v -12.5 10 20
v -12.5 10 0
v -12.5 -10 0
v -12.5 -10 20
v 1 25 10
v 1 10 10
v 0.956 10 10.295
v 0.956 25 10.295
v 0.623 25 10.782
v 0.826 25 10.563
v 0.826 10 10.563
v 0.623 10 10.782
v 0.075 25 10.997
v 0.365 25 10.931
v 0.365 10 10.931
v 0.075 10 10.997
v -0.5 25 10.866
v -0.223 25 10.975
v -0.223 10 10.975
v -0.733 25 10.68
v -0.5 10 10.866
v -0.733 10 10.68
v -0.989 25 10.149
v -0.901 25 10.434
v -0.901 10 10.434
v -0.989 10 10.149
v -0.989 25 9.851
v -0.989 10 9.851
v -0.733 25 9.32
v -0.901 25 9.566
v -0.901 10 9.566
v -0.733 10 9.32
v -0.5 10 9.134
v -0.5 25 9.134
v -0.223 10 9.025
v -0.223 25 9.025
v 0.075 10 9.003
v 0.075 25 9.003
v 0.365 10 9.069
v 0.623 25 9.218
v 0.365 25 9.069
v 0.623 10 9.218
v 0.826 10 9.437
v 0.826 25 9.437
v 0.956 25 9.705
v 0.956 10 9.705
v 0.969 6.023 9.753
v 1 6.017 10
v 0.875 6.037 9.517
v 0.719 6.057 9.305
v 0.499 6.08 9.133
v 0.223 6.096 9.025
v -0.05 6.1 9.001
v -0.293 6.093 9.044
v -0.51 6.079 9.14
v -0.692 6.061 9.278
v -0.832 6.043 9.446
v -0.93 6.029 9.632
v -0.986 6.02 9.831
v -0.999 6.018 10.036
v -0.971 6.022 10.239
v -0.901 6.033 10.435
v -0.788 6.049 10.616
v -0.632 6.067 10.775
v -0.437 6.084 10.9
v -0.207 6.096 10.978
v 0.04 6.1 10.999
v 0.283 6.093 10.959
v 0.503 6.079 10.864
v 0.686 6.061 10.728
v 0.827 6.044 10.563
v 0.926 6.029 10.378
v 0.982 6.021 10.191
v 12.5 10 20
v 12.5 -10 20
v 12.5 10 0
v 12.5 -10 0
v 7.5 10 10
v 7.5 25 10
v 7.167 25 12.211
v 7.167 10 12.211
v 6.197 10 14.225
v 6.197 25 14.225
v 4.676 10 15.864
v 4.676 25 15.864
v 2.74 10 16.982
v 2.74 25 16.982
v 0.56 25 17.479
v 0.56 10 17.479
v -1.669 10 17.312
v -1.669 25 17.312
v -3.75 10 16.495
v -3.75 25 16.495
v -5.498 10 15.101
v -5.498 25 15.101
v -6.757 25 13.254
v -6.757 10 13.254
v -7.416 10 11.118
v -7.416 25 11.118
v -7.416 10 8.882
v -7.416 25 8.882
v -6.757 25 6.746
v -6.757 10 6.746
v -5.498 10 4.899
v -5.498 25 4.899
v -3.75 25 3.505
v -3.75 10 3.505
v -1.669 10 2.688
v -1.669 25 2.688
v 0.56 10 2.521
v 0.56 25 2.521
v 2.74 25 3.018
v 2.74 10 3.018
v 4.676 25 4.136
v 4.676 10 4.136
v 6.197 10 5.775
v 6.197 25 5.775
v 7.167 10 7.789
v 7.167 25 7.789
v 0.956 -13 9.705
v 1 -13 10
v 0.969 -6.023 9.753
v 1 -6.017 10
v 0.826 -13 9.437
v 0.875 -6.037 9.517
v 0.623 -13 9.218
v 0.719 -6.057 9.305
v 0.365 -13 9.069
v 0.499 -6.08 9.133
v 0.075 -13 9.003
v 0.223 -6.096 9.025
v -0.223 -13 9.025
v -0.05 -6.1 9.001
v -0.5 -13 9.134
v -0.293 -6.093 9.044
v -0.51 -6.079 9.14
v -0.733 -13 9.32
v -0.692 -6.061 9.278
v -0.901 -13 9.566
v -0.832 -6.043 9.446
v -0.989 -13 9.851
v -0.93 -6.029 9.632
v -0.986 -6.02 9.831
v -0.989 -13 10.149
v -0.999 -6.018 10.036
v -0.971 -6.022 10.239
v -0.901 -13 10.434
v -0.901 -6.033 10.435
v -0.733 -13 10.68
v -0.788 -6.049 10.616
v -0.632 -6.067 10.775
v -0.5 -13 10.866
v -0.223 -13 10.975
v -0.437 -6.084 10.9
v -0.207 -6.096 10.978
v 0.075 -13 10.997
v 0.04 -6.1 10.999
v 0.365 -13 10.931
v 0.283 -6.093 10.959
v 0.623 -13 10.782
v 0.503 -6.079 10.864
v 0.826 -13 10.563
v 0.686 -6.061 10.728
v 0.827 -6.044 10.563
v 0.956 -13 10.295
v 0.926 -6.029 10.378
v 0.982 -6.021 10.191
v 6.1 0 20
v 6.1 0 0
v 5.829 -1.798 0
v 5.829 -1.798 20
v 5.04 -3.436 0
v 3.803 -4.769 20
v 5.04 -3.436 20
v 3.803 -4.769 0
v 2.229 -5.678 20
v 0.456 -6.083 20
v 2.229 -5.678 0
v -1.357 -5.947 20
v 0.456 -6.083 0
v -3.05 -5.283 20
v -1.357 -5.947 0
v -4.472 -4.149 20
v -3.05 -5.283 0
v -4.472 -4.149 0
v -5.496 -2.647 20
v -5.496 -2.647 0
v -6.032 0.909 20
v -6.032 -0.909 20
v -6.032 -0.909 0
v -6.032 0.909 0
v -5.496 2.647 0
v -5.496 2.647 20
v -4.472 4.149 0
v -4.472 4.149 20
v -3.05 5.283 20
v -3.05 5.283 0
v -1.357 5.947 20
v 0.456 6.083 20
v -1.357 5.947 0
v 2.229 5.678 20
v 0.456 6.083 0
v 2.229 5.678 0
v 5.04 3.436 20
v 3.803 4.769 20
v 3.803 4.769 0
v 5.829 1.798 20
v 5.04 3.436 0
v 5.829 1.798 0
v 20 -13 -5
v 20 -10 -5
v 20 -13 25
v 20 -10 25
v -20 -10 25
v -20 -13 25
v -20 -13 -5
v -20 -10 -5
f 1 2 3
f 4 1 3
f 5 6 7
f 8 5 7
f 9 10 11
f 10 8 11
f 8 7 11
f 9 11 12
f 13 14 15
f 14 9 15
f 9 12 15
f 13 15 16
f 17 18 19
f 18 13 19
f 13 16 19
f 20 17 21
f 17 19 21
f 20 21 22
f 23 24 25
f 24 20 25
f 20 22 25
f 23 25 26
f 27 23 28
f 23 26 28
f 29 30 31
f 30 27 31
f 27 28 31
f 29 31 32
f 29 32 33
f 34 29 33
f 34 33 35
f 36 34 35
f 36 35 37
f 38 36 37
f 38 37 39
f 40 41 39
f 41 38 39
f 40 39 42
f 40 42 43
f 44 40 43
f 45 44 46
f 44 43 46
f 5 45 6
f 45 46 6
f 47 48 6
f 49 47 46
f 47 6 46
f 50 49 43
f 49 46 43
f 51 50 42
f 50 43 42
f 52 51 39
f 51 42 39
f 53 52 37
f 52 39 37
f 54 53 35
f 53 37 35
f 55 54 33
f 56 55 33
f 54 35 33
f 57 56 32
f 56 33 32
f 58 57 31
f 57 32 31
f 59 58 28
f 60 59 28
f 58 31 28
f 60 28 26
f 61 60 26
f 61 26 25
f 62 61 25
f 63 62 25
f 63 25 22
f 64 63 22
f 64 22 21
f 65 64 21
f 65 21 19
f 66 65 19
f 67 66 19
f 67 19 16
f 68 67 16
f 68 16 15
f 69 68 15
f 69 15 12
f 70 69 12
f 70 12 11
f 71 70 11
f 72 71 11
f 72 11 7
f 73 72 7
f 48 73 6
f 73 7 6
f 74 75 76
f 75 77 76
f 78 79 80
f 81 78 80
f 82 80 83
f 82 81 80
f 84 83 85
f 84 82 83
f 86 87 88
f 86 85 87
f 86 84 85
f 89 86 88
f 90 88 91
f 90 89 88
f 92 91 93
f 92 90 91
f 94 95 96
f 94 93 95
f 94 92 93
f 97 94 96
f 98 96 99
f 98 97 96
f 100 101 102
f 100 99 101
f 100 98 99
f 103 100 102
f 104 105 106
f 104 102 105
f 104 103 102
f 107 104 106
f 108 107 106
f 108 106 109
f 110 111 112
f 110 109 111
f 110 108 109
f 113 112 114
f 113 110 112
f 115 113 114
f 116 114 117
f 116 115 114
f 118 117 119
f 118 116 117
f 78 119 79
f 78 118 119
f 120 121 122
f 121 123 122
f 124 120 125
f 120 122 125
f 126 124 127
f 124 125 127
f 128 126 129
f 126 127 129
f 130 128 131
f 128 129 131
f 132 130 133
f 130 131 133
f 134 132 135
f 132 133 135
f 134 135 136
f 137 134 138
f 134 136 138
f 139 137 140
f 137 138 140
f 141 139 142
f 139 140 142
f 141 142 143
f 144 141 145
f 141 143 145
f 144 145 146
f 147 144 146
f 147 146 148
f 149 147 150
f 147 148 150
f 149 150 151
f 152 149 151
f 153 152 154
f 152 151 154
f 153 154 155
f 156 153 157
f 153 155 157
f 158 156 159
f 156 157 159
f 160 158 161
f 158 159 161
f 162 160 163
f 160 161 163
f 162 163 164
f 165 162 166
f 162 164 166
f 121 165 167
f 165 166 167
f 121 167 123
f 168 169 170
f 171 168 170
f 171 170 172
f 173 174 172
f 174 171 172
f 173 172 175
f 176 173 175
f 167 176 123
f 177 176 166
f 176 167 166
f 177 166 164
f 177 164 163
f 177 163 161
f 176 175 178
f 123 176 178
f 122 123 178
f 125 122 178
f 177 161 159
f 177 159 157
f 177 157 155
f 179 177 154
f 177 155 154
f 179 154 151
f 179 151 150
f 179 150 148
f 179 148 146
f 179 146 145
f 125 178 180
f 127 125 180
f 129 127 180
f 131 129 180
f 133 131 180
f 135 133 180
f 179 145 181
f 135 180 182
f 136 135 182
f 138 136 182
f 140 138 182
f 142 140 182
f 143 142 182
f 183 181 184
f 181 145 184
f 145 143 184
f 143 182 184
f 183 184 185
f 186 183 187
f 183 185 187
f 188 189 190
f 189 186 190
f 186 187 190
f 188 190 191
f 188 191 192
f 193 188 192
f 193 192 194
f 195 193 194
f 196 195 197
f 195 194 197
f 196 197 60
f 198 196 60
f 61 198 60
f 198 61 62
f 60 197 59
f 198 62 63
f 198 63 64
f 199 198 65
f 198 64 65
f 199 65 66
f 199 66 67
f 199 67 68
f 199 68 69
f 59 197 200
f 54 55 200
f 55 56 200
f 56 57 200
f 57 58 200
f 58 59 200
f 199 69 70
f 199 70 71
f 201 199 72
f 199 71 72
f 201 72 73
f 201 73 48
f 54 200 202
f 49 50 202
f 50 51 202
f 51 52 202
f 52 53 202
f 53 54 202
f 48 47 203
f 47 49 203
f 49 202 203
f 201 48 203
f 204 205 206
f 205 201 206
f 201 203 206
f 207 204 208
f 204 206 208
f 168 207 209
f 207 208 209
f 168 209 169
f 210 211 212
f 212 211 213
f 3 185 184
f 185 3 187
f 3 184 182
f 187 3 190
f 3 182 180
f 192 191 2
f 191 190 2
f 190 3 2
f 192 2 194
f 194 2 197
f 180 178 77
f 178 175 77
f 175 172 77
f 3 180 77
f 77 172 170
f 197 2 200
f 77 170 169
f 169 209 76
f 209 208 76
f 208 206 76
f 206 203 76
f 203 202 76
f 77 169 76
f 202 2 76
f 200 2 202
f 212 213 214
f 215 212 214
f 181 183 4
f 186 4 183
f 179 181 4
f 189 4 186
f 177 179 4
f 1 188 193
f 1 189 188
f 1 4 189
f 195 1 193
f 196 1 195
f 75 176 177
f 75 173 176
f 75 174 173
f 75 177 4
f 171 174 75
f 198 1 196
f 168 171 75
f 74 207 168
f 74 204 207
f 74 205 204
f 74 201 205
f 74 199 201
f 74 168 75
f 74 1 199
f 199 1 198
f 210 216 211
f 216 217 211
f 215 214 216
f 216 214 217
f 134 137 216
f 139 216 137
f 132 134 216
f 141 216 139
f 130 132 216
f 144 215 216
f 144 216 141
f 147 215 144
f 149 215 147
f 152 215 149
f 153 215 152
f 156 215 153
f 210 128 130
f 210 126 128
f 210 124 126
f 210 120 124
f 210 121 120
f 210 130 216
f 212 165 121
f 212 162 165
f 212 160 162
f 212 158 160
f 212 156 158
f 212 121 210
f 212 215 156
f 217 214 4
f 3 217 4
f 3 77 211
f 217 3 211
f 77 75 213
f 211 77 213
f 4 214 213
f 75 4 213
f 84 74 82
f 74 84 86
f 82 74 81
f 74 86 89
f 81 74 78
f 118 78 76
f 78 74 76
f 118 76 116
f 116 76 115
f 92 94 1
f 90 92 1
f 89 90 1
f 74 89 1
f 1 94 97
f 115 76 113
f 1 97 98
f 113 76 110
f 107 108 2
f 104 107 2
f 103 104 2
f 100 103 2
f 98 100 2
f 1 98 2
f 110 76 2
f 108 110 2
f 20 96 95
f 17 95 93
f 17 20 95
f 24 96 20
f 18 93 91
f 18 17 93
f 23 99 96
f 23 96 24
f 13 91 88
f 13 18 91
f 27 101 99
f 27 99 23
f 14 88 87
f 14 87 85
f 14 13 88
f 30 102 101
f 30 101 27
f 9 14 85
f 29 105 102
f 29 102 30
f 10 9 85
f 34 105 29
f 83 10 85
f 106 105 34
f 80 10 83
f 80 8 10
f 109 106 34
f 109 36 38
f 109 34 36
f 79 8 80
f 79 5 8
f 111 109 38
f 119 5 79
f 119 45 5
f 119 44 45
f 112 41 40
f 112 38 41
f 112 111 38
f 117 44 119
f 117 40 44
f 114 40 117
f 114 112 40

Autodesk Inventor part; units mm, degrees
ref_plane "YZ Plane" through (0, 0, 0) normal (1, 0, 0) x (0, 1, 0)
ref_plane "XZ Plane" through (0, 0, 0) normal (0, 1, 0) x (-1, 0, 0)
ref_plane "XY Plane" through (0, 0, 0) normal (0, 0, 1) x (1, 0, 0)
sketch "Sketch1" plane through (0, 0, 0) normal (0, 0, 1) x (1, 0, 0)
  circle A0 centre (0, 0) radius 6.1
  line L0 (-12.5, -10) -> (12.5, -10)
  line L1 (12.5, -10) -> (12.5, 10)
  line L2 (12.5, 10) -> (-12.5, 10)
  line L3 (-12.5, 10) -> (-12.5, -10)
  line L4 (-12.5, -10) -> (12.5, 10) construction
  line L5 (12.5, -10) -> (-12.5, 10) construction
  dimension "d0" = 12.2
  dimension "d1" = 25
  dimension "d2" = 20
extrude "Extrusion1" add sketch "Sketch1" along normal blind 20
sketch "Sketch2" plane through (-12.5, 10, 0) normal (0, 1, 0) x (1, 0, 0)
  line L0 (0, 0) -> (0, -20) construction
  line L1 (25, -20) -> (0, -20) construction
  line L2 (0, 0) -> (25, -20) construction
  line L3 (0, -20) -> (25, 0) construction
  circle A0 centre (12.5, -10) radius 1
  point P0 (12.5, 0)
  dimension "d5" = 2
extrude "Extrusion2" cut sketch "Sketch2" against normal blind 100
sketch "Sketch3" plane through (-12.5, 10, 0) normal (0, 1, 0) x (1, 0, 0)
  circle A0 centre (12.5, -10) radius 1 projected
  line L0 (25, 0) -> (0, 0) projected
  line L1 (0, 0) -> (0, -20) projected
  line L2 (25, -20) -> (0, -20) projected
  line L3 (25, 0) -> (25, -20) projected
  circle A1 centre (12.5, -10) radius 7.5
  point P0 (12.5, 0)
  dimension "d8" = 15
extrude "Extrusion3" add sketch "Sketch3" along normal blind 15 contours A1
sketch "Sketch4" plane through (-12.5, -10, 0) normal (0, -1, 0) x (1, 0, 0)
  line L0 (32.5, 25) -> (-7.5, 25)
  line L1 (-7.5, 25) -> (-7.5, -5)
  line L2 (-7.5, -5) -> (32.5, -5)
  line L3 (32.5, -5) -> (32.5, 25)
  circle A0 centre (12.5, 10) radius 1 projected
  line L4 (32.5, 25) -> (-7.5, -5) construction
  line L5 (-7.5, 25) -> (32.5, -5) construction
  point P0 (12.5, 0)
  dimension "d11" = 30
  dimension "d12" = 40
extrude "Extrusion4" add sketch "Sketch4" along normal blind 3
properties part number "Arm_clip_template"
